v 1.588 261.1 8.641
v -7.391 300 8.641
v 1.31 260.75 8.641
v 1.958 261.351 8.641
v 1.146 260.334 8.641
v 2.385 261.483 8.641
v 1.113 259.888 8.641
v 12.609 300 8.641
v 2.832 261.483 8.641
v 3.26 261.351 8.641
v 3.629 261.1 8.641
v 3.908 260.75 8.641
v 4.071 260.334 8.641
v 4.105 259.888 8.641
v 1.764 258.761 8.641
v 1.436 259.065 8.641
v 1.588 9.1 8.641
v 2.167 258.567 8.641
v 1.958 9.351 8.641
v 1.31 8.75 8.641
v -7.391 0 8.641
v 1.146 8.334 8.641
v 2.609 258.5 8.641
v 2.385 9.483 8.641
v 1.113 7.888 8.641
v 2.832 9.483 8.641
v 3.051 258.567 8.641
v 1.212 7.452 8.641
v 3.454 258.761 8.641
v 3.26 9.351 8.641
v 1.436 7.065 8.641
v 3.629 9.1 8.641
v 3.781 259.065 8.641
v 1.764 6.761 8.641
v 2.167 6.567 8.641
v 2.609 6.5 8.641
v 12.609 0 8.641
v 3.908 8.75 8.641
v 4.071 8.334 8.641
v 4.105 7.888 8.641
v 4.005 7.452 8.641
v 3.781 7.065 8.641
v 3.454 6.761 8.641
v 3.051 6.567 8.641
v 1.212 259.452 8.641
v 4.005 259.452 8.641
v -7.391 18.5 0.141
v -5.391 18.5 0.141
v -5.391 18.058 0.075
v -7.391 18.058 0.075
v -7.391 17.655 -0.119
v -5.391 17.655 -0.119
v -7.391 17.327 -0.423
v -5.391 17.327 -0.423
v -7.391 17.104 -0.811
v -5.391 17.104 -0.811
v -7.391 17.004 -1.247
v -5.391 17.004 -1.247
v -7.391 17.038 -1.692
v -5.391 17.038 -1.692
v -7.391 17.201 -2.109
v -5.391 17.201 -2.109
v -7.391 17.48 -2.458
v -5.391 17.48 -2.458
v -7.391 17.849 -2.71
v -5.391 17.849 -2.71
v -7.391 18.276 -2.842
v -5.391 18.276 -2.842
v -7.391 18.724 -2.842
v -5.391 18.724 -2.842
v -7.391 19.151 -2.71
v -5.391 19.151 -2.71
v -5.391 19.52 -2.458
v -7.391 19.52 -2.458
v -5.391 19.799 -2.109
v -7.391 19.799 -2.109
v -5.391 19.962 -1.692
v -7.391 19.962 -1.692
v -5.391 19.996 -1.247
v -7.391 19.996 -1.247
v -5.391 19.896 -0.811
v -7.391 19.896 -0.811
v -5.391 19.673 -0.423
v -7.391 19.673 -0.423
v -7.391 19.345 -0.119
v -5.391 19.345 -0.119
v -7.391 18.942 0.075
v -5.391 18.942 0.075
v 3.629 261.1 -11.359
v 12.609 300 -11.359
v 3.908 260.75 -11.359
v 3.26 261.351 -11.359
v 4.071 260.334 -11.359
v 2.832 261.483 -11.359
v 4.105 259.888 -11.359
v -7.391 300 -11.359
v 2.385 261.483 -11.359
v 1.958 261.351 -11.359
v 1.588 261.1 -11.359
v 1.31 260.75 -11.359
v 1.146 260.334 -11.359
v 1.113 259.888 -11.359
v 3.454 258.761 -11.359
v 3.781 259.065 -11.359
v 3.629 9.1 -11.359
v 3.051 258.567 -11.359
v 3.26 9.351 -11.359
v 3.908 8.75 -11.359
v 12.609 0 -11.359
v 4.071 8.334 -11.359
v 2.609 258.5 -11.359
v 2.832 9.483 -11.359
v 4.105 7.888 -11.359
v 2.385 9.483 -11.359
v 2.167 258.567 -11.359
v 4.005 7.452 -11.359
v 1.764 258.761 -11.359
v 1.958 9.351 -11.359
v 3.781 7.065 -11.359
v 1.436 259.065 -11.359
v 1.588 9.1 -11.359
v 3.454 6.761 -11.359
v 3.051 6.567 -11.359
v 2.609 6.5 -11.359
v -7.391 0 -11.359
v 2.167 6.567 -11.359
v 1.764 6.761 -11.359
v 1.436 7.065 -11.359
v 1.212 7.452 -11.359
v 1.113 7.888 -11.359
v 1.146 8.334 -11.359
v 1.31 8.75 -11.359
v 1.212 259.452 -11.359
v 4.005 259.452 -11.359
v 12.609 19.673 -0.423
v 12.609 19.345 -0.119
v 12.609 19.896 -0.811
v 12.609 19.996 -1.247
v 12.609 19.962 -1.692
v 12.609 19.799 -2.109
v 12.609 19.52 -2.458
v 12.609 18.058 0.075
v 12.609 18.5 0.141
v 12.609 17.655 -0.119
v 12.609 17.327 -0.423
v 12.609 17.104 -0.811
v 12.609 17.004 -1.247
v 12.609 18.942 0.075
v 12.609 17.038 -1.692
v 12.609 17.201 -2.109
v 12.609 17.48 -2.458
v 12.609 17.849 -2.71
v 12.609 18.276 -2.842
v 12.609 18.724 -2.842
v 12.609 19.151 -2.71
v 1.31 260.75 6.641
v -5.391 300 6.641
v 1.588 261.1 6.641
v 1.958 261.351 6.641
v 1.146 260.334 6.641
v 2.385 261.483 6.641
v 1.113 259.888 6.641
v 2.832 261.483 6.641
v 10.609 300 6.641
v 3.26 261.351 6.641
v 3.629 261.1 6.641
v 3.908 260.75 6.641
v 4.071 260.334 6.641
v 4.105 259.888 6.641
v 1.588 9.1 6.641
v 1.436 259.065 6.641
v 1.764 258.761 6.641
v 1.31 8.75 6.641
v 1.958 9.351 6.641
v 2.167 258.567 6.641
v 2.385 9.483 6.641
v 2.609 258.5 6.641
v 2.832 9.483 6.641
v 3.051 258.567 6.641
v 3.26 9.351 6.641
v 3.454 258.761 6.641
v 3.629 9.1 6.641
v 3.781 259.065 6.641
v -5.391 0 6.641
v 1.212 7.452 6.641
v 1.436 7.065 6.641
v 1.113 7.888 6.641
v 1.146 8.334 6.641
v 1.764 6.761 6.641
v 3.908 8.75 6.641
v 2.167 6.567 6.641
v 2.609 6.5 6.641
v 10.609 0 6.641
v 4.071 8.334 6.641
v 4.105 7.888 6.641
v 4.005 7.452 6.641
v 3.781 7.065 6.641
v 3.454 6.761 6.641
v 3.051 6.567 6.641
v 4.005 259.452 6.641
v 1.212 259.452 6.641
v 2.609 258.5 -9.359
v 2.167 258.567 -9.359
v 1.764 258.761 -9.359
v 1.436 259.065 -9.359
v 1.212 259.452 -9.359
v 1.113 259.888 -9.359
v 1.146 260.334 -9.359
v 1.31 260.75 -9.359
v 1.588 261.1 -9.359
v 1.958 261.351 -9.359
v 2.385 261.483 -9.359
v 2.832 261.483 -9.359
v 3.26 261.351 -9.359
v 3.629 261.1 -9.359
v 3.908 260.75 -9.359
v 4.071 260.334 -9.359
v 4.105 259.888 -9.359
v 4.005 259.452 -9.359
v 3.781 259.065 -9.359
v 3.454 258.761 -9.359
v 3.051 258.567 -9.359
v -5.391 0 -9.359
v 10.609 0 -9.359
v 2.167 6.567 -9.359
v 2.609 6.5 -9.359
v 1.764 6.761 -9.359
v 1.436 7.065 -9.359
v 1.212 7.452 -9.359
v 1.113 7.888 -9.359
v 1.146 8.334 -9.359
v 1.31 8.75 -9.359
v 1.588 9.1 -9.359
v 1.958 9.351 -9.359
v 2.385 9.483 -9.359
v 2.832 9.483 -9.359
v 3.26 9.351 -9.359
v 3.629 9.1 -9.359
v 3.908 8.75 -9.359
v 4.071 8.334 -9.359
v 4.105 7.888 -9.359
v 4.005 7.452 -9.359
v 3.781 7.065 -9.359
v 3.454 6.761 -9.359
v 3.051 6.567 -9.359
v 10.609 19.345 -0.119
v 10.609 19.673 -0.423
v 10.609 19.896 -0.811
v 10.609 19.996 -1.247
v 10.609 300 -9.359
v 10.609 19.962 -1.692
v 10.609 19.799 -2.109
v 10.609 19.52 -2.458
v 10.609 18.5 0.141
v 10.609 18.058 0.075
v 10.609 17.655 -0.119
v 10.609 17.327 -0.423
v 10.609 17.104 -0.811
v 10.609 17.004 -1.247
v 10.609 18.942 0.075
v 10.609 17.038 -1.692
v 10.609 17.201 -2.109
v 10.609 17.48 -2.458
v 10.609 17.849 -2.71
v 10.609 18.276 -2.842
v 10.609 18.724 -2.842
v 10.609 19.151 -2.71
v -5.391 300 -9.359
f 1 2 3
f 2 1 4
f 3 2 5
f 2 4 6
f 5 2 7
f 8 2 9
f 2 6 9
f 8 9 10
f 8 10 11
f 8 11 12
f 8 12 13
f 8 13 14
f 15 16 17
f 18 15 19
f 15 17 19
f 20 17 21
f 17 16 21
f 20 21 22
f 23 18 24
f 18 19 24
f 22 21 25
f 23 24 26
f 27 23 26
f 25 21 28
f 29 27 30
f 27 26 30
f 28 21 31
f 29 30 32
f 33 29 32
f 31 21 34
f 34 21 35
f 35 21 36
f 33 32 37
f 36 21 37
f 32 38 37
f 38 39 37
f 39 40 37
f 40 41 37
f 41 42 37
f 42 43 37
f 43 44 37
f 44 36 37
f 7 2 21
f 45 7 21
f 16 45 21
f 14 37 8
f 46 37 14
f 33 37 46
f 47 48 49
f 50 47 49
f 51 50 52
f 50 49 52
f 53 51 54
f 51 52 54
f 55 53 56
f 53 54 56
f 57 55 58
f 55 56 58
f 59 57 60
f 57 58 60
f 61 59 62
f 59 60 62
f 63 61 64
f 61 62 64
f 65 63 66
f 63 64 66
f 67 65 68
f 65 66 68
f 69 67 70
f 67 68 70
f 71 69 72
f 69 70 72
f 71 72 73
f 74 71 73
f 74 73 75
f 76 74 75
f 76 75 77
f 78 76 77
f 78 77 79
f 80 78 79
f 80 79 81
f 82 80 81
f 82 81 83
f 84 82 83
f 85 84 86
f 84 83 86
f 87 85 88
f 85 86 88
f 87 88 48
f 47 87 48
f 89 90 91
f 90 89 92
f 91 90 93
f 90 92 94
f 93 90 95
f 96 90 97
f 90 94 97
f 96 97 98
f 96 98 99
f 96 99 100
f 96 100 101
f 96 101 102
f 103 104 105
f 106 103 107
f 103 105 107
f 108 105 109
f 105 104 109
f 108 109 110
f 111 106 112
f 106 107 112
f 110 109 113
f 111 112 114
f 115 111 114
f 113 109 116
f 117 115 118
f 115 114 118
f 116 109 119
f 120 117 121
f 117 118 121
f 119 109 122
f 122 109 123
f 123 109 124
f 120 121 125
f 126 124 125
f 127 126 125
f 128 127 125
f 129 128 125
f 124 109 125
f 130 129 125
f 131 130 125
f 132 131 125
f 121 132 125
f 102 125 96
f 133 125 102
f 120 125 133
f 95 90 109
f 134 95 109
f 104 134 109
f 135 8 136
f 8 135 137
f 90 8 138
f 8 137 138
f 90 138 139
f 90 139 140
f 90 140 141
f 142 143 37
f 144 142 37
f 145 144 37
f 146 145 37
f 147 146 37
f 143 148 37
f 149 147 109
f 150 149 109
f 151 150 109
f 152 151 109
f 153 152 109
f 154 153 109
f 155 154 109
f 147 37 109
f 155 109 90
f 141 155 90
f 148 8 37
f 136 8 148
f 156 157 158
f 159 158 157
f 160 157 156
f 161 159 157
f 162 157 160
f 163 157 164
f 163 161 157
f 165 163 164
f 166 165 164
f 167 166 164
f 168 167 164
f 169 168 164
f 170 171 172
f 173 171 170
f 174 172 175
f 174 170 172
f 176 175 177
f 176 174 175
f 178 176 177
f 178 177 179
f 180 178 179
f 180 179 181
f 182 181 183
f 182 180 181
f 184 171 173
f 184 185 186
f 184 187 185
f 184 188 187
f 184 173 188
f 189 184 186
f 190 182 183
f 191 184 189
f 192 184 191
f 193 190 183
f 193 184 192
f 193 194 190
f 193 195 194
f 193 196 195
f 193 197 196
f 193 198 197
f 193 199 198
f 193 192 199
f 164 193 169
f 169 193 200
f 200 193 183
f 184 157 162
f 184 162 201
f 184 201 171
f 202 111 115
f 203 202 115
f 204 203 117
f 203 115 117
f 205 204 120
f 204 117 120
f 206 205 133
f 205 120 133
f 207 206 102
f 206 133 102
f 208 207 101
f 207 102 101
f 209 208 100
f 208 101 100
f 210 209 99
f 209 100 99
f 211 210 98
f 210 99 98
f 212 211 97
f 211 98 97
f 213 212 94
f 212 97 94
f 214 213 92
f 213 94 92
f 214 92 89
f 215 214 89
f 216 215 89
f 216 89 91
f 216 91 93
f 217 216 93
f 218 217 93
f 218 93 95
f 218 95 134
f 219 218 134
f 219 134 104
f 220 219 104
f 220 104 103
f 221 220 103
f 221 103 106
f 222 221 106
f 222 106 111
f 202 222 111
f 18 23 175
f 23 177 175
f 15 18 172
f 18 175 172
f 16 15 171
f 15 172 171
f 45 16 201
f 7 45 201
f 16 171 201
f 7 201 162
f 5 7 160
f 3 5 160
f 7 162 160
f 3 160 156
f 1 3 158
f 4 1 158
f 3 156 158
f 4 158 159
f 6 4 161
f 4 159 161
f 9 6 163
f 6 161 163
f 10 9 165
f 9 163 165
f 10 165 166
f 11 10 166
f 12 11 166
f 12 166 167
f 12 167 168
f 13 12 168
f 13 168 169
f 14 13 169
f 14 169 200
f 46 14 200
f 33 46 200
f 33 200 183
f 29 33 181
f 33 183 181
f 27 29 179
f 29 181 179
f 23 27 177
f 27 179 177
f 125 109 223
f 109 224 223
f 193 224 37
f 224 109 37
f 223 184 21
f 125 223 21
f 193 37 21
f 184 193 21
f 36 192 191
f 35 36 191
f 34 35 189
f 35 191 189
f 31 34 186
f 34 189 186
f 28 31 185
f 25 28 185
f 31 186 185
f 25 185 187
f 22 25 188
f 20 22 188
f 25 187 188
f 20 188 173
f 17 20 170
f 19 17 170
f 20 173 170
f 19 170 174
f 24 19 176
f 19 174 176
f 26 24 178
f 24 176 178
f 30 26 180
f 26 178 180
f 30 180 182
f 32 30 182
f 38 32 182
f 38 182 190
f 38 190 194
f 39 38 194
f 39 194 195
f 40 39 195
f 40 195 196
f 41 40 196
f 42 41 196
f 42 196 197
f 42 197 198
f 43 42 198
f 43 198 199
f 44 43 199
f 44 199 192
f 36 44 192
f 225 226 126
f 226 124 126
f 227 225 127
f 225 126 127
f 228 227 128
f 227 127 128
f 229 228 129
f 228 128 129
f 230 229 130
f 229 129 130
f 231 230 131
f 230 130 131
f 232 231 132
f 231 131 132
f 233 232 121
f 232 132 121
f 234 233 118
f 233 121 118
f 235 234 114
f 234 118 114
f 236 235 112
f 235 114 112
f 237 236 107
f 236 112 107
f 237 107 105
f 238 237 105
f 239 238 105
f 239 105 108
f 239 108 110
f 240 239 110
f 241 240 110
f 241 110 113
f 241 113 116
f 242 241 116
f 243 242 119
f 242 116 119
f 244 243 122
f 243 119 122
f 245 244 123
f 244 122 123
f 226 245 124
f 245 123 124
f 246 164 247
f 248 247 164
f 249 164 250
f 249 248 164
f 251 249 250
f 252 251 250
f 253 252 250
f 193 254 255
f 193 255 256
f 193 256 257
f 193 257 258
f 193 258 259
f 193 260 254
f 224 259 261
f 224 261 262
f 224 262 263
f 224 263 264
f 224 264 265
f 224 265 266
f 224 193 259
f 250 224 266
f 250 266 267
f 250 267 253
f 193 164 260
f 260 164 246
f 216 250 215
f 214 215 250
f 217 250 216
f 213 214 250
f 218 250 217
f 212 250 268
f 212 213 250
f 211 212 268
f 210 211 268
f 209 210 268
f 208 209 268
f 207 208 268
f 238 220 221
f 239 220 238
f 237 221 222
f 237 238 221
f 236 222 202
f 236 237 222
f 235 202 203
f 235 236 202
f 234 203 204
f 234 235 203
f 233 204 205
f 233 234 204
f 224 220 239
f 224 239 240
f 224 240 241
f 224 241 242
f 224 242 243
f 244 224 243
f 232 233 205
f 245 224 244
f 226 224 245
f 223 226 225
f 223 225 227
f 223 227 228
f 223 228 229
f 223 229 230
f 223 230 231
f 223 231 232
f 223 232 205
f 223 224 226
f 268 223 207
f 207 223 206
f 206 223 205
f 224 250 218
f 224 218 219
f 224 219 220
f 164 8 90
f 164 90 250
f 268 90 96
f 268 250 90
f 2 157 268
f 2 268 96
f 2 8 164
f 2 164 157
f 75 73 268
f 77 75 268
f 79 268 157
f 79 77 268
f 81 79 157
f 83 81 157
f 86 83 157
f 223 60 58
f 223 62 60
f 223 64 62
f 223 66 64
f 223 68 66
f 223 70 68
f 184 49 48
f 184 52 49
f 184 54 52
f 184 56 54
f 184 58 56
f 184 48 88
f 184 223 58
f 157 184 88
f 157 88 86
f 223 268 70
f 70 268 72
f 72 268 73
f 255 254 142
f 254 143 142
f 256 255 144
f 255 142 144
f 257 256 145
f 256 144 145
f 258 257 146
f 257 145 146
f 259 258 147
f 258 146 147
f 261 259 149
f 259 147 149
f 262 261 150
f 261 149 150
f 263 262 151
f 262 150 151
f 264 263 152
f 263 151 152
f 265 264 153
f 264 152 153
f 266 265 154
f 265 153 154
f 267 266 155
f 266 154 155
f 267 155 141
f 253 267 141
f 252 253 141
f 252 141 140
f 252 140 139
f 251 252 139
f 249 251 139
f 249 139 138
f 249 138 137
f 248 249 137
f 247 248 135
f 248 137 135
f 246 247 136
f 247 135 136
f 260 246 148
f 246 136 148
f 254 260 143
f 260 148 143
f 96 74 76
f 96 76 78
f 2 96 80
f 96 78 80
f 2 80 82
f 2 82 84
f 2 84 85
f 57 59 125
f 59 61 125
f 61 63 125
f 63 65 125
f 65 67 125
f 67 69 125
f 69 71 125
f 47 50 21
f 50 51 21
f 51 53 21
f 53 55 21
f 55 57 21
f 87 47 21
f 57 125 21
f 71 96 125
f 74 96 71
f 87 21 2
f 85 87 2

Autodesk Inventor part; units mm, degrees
ref_plane "YZ Plane" through (0, 0, 0) normal (1, 0, 0) x (0, 1, 0)
ref_plane "XZ Plane" through (0, 0, 0) normal (0, 1, 0) x (-1, 0, 0)
ref_plane "XY Plane" through (0, 0, 0) normal (0, 0, 1) x (1, 0, 0)
sketch "Sketch1" plane through (0, 0, 0) normal (0, 1, 0) x (-1, 0, 0)
  line L0 (7.3913, 8.6413) -> (-12.6087, 8.6413)
  line L1 (-12.6087, 8.6413) -> (-12.6087, -11.3587)
  line L2 (-12.6087, -11.3587) -> (7.3913, -11.3587)
  line L3 (7.3913, -11.3587) -> (7.3913, 8.6413)
  line L4 (5.3913, 6.6413) -> (-10.6087, 6.6413)
  line L5 (-10.6087, 6.6413) -> (-10.6087, -9.3587)
  line L6 (-10.6087, -9.3587) -> (5.3913, -9.3587)
  line L7 (5.3913, -9.3587) -> (5.3913, 6.6413)
  point P0 (0, 0)
  dimension "d0" = 20
  dimension "d1" = 20
  dimension "d2" = 2
  dimension "d3" = 2
  dimension "d4" = 2
  dimension "d5" = 2
extrude "Extrusion1" add sketch "Sketch1" along normal blind 300
sketch "Sketch2" plane through (-7.3913, 0, 8.6413) normal (0, 0, 1) x (1, 0, 0)
  circle A0 centre (10, 8) radius 1.5
  line L0 (0, 0) -> (0, 300) projected
  line L1 (0, 0) -> (20, 0) projected
  circle A1 centre (10, 260) radius 1.5
  line L2 (0, 300) -> (20, 300) projected
  point P0 (7.3913, 0)
  dimension "d8" = 3
  dimension "d9" = 10
  dimension "d10" = 8
  dimension "d28" = 3
  dimension "d29" = 10
  dimension "d30" = 40
hole "Hole1" at (2.6087, 8, 8.6413) at (2.6087, 260, 8.6413) direction (0, 0, -1) diameter 3 end through all
sketch "Sketch3" plane through (-7.3913, 0, -11.3587) normal (-1, 0, 0) x (0, 0, 1)
  circle A0 centre (10, 18.5) radius 1.5
  line L0 (0, 0) -> (20, 0) projected
  line L1 (0, 0) -> (0, 300) projected
  point P0 (11.3587, 0)
  dimension "d18" = 18.5
  dimension "d19" = 10
  dimension "d20" = 3
hole "Hole2" at (-7.3913, 18.5, -1.3587) direction (1, 0, 0) diameter 3 end through all
properties part number "profile_alu"
